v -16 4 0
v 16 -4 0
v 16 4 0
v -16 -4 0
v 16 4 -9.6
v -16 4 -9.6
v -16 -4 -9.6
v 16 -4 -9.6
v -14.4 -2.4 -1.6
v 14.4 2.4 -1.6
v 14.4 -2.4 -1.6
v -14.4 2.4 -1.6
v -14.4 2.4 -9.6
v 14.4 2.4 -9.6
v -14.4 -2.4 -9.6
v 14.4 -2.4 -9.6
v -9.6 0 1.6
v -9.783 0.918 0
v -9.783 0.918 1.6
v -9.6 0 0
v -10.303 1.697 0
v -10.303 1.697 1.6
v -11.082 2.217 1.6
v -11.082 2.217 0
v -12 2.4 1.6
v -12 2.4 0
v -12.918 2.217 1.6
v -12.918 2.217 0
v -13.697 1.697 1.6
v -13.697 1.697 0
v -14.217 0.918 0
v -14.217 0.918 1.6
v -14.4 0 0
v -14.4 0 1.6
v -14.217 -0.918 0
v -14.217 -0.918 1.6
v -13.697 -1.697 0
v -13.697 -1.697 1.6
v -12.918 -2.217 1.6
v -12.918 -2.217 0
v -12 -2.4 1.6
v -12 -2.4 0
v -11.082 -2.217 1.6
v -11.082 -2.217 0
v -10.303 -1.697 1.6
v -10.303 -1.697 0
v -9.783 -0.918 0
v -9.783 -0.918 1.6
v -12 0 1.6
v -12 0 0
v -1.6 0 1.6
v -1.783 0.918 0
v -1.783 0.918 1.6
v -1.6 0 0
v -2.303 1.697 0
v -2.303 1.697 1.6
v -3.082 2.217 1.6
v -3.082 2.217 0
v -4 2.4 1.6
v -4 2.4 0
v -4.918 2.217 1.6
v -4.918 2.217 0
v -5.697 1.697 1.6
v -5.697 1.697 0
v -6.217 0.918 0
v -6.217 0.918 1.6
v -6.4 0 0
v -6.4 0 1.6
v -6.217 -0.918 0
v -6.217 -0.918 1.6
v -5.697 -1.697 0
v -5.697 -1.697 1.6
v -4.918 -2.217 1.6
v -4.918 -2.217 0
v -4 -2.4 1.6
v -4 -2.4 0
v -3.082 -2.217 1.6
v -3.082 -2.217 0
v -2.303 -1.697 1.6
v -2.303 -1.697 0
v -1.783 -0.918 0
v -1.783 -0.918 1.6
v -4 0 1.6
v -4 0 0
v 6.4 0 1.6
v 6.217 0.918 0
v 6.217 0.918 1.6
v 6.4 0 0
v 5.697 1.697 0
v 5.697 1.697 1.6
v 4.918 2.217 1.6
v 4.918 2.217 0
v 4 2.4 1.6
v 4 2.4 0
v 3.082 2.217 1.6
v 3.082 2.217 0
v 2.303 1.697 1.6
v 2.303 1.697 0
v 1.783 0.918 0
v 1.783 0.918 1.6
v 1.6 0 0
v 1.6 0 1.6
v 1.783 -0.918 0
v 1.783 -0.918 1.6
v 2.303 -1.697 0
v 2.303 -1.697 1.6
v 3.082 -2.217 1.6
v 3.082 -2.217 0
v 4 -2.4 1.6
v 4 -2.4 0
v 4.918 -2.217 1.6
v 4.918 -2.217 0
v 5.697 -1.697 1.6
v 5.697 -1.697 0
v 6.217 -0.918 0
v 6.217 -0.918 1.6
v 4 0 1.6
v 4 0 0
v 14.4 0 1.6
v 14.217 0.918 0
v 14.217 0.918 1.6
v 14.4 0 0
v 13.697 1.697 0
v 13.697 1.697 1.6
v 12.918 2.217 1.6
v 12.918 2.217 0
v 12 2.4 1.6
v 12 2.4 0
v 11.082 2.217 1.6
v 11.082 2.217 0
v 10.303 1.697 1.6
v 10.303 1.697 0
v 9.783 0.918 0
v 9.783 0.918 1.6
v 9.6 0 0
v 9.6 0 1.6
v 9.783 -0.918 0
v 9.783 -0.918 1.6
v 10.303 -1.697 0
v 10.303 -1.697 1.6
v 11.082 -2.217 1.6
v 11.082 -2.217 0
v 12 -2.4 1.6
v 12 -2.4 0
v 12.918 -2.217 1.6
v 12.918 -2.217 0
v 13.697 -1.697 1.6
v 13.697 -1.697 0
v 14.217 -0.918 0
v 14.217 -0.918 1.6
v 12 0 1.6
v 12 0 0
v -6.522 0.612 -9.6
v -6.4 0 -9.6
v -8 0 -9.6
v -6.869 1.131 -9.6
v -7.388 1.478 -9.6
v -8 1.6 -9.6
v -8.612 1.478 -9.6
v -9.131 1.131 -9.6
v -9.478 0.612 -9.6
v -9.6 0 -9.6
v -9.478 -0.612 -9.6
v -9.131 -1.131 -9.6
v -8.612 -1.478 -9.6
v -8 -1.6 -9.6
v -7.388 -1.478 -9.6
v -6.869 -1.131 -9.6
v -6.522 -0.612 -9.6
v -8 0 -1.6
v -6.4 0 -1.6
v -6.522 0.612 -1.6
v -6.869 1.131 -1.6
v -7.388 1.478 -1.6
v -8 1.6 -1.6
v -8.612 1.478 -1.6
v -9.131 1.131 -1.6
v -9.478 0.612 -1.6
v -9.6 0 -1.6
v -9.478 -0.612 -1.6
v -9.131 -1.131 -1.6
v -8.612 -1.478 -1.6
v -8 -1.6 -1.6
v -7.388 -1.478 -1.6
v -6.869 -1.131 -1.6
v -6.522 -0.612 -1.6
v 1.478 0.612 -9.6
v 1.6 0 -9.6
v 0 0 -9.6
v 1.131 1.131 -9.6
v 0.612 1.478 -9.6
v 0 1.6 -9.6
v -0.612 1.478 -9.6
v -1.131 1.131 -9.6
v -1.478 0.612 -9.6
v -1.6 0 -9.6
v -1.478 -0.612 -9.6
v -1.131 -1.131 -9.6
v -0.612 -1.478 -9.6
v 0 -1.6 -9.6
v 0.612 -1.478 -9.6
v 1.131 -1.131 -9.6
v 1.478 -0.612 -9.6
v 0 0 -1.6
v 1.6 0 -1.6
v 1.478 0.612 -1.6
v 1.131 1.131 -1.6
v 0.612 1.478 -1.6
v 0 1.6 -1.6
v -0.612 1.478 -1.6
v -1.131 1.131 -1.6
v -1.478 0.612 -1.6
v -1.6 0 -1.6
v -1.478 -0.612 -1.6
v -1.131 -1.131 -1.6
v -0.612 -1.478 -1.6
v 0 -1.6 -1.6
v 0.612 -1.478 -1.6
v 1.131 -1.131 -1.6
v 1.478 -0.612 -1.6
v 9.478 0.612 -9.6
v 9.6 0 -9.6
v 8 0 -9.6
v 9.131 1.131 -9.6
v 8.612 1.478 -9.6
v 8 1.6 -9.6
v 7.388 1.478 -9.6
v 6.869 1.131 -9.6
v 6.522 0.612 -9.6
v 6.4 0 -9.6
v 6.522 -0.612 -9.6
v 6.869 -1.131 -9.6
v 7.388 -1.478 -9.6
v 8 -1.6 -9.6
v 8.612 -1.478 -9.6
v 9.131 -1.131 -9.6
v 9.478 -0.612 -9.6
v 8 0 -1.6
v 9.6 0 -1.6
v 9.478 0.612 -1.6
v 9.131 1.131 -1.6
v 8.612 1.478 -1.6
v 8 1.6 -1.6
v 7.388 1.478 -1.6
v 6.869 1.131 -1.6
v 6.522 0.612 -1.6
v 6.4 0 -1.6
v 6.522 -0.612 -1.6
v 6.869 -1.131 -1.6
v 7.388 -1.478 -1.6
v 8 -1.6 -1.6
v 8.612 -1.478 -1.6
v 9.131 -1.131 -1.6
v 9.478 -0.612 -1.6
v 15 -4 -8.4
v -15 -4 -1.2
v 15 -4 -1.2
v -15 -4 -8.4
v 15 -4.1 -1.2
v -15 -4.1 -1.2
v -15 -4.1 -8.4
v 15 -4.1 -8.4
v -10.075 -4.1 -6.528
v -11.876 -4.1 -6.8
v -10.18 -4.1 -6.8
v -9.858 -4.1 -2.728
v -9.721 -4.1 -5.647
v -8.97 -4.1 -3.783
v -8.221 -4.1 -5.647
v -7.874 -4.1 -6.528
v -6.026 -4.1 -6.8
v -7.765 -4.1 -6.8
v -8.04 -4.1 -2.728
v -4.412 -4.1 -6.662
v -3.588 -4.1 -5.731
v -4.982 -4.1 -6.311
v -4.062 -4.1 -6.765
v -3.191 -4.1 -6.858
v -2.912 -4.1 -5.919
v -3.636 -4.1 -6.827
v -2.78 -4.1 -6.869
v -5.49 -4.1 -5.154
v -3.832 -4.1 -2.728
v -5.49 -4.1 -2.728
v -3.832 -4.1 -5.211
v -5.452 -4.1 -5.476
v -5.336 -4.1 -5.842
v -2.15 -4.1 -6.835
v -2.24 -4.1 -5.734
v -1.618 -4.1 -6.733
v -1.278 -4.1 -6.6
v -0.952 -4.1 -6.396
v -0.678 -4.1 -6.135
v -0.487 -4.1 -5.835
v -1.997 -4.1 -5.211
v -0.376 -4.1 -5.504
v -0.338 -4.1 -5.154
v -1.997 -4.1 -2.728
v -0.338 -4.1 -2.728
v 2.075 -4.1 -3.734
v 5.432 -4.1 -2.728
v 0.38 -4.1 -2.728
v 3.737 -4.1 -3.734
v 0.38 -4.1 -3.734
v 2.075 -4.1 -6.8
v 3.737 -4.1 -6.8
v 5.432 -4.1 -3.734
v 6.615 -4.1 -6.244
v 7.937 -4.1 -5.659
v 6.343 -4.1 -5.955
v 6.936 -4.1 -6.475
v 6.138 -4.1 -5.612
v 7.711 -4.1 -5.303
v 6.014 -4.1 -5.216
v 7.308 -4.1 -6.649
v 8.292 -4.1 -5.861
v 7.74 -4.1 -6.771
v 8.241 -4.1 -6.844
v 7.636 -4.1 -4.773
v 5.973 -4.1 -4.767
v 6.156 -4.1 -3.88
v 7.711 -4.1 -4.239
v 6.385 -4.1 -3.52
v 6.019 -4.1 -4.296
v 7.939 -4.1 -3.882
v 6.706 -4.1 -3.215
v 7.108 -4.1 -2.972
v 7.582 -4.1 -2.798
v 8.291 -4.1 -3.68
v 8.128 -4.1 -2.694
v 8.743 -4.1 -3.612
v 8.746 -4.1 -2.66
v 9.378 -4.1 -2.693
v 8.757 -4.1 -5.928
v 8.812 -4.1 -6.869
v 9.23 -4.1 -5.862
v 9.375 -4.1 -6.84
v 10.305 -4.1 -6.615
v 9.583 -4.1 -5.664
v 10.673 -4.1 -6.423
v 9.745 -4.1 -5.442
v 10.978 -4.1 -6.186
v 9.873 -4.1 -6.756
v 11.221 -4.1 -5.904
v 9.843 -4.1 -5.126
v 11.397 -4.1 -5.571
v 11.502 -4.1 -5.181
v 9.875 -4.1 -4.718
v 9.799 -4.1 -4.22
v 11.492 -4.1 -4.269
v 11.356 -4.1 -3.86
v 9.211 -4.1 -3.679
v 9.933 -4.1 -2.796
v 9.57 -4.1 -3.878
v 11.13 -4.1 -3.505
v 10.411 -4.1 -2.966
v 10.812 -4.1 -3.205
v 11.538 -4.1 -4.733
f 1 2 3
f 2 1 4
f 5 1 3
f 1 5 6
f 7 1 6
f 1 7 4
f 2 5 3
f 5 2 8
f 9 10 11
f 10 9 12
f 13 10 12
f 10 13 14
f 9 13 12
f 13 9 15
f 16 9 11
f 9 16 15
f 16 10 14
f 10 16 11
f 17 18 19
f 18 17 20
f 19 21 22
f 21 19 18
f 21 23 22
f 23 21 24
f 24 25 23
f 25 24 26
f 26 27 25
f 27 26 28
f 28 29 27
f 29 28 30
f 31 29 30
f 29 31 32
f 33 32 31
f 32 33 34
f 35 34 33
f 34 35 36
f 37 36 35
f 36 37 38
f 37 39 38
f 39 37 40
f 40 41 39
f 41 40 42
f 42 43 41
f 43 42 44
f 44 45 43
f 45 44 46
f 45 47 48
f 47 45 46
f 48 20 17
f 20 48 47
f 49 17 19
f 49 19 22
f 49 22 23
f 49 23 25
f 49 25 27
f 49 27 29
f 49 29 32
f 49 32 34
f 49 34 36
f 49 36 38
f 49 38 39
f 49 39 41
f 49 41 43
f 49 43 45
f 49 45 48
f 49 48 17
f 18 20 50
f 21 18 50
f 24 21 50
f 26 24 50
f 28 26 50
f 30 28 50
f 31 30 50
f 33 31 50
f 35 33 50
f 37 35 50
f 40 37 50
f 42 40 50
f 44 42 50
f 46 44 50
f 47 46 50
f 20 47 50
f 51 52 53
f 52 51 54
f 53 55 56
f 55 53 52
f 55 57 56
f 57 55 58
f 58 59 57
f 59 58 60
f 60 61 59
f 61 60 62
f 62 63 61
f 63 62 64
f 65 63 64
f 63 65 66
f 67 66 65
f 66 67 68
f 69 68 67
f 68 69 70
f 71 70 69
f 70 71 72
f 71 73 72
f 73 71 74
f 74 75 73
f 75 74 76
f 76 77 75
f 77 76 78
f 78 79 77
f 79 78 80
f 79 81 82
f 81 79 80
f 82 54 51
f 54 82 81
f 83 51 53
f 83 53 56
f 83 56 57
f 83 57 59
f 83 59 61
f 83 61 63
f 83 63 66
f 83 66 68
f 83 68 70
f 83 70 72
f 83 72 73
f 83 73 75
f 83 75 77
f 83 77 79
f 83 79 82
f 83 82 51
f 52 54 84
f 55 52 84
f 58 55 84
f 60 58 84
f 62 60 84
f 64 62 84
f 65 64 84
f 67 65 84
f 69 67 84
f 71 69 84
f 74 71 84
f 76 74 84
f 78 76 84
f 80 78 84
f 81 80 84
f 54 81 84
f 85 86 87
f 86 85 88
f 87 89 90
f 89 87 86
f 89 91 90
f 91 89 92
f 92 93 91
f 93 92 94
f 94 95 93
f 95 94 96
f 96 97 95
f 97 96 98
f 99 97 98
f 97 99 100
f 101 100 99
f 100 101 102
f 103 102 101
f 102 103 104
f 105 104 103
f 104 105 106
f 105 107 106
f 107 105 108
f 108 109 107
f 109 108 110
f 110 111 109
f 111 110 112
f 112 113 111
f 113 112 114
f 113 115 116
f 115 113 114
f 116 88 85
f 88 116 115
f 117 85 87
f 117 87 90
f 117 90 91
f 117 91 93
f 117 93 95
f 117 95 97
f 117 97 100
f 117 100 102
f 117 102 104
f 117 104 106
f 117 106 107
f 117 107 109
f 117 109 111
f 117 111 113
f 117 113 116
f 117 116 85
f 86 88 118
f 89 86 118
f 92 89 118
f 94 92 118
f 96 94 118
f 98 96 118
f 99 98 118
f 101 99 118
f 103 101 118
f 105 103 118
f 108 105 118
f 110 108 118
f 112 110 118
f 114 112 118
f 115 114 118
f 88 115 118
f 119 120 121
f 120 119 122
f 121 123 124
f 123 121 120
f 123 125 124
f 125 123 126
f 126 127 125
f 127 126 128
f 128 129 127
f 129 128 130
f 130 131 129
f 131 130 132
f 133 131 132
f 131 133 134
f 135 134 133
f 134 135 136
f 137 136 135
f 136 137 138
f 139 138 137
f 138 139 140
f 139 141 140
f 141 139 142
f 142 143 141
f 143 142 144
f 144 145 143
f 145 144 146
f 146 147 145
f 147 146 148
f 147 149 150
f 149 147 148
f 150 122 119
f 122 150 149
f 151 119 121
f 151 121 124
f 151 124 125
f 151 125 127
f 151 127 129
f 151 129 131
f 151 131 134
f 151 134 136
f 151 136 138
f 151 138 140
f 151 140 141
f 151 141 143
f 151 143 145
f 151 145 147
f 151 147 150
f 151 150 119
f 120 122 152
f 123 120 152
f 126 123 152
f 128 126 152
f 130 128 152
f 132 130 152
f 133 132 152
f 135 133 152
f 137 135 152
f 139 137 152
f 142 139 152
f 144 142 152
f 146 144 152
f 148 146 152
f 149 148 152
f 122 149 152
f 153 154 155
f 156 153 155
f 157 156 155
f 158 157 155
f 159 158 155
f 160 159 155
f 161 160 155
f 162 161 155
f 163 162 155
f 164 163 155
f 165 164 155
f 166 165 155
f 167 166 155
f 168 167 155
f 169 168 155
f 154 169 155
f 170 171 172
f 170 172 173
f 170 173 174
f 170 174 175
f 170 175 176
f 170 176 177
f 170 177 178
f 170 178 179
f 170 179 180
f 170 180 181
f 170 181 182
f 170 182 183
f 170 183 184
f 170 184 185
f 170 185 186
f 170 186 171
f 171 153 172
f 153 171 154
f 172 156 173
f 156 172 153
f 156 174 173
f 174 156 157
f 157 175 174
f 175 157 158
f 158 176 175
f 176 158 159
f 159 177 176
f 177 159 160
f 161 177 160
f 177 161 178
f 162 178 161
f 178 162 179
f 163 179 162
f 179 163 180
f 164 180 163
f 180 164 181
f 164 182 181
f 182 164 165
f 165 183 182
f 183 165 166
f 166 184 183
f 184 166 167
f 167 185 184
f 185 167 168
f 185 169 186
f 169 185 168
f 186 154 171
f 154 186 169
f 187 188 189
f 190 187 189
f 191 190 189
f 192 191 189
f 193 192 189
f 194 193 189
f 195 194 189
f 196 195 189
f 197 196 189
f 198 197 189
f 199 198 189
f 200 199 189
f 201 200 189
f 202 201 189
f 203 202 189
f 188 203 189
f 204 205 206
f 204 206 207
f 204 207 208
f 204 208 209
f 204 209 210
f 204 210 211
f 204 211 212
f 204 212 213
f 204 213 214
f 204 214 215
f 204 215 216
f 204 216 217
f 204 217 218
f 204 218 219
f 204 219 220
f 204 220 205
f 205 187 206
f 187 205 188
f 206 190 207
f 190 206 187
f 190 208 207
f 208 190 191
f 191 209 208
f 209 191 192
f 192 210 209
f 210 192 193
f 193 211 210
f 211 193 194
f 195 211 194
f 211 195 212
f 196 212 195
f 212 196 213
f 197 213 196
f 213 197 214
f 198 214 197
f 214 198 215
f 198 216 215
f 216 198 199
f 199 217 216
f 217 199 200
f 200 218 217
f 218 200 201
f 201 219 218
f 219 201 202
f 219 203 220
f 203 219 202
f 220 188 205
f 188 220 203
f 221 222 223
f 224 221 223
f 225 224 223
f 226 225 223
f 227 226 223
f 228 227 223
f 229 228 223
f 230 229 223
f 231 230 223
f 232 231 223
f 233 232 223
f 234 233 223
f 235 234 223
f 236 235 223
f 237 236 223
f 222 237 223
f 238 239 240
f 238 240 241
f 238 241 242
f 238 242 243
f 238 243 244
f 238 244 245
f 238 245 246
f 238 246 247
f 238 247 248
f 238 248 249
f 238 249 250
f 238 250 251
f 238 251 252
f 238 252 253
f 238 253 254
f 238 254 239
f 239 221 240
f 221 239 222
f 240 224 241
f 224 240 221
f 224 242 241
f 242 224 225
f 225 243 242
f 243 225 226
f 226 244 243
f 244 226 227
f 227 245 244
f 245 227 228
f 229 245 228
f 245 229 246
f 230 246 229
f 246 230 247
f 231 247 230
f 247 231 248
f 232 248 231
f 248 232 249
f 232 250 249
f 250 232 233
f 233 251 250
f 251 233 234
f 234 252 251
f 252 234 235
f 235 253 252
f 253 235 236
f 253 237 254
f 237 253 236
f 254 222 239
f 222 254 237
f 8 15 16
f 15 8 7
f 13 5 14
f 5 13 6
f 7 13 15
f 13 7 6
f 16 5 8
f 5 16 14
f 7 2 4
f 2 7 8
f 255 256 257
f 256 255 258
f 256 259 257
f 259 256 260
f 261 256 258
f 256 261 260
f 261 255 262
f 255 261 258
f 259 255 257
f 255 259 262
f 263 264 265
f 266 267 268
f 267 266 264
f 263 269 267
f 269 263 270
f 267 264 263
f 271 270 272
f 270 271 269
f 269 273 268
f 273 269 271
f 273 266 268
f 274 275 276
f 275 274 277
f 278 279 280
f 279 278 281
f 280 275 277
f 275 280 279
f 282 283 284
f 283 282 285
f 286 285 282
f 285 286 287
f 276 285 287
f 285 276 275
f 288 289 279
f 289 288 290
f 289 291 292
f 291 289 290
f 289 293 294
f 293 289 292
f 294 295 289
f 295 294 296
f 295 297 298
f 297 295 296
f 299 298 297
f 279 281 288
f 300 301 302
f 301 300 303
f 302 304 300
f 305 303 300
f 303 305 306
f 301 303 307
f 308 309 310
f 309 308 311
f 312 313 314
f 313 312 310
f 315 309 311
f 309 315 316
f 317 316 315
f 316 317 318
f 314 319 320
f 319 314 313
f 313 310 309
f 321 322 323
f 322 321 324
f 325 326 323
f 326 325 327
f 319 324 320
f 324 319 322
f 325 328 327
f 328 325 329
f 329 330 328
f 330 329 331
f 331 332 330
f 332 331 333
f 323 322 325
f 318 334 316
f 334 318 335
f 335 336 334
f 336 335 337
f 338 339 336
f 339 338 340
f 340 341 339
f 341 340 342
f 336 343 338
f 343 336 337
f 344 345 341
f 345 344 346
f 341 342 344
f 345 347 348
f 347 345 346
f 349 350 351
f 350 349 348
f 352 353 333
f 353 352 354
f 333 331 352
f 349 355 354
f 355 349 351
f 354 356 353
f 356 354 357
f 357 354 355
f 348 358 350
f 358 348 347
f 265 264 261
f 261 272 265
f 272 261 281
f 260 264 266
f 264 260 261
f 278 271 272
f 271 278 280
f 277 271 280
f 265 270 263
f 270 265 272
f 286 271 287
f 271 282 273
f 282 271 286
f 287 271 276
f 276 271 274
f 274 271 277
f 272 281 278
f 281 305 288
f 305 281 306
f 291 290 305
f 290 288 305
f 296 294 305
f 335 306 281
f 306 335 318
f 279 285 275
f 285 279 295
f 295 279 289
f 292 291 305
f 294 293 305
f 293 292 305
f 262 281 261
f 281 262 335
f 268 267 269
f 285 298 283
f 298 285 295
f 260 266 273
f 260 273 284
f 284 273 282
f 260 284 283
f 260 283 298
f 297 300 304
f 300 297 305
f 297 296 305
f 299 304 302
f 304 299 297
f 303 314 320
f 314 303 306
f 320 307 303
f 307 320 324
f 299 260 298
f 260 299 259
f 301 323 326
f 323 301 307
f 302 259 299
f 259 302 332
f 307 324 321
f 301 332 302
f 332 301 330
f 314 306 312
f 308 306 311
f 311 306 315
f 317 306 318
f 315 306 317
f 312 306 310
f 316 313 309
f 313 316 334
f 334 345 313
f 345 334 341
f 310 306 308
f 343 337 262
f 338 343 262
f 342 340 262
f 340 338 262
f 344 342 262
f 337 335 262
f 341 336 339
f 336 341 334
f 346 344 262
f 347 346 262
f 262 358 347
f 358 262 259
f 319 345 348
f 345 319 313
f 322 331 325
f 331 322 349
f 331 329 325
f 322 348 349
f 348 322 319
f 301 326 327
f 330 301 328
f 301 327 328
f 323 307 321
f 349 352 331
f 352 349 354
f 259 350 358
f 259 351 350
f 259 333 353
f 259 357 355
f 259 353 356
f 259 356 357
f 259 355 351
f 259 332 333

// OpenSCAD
// file: ../p/4-4edge.scad
use <../lib.scad>
function ldraw_lib__4_4edge() = [
// 0 Circle 1.0
// 0 Name: 4-4edge.dat
// 0 Author: James Jessiman
// 0 !LDRAW_ORG Primitive UPDATE 2017-01
// 0 !LICENSE Licensed under CC BY 2.0 and CC BY 4.0 : see CAreadme.txt
// 
// 0 BFC CERTIFY CCW
  [0,"BFC","CERTIFY"],
  [0,"BFC","CCW"],
// 
// 0 !HISTORY 1998-12-15 [PTadmin] Official Update 1998-10
// 0 !HISTORY 2005-12-28 [PTadmin] Official Update 2005-01
// 0 !HISTORY 2007-06-24 [PTadmin] Header formatted for Contributor Agreement
// 0 !HISTORY 2008-07-01 [PTadmin] Official Update 2008-01
// 0 !HISTORY 2017-01-15 [Steffen] BFCed
// 0 !HISTORY 2017-12-30 [PTadmin] Official Update 2017-01
// 
// 
// 2 24 1 0 0 0.9239 0 0.3827
  [2,24,1,0,0,0.9239,0,0.3827],
// 2 24 0.9239 0 0.3827 0.7071 0 0.7071
  [2,24,0.9239,0,0.3827,0.7071,0,0.7071],
// 2 24 0.7071 0 0.7071 0.3827 0 0.9239
  [2,24,0.7071,0,0.7071,0.3827,0,0.9239],
// 2 24 0.3827 0 0.9239 0 0 1
  [2,24,0.3827,0,0.9239,0,0,1],
// 2 24 0 0 1 -0.3827 0 0.9239
  [2,24,0,0,1,-0.3827,0,0.9239],
// 2 24 -0.3827 0 0.9239 -0.7071 0 0.7071
  [2,24,-0.3827,0,0.9239,-0.7071,0,0.7071],
// 2 24 -0.7071 0 0.7071 -0.9239 0 0.3827
  [2,24,-0.7071,0,0.7071,-0.9239,0,0.3827],
// 2 24 -0.9239 0 0.3827 -1 0 -0
  [2,24,-0.9239,0,0.3827,-1,0,-0],
// 2 24 -1 0 -0 -0.9239 0 -0.3827
  [2,24,-1,0,-0,-0.9239,0,-0.3827],
// 2 24 -0.9239 0 -0.3827 -0.7071 0 -0.7071
  [2,24,-0.9239,0,-0.3827,-0.7071,0,-0.7071],
// 2 24 -0.7071 0 -0.7071 -0.3827 0 -0.9239
  [2,24,-0.7071,0,-0.7071,-0.3827,0,-0.9239],
// 2 24 -0.3827 0 -0.9239 0 0 -1
  [2,24,-0.3827,0,-0.9239,0,0,-1],
// 2 24 0 0 -1 0.3827 0 -0.9239
  [2,24,0,0,-1,0.3827,0,-0.9239],
// 2 24 0.3827 0 -0.9239 0.7071 0 -0.7071
  [2,24,0.3827,0,-0.9239,0.7071,0,-0.7071],
// 2 24 0.7071 0 -0.7071 0.9239 0 -0.3827
  [2,24,0.7071,0,-0.7071,0.9239,0,-0.3827],
// 2 24 0.9239 0 -0.3827 1 0 0
  [2,24,0.9239,0,-0.3827,1,0,0],
];
module ldraw_lib__4_4edge(step=0, col=false, unit=2/5, alt=false, line=0.2, solid=!$preview)
    makepoly(ldraw_lib__4_4edge(), step=step, col=col, unit=unit, alt=alt, line=line, solid=solid);
ldraw_lib__4_4edge(line=0.2);
// file: ../p/4-4disc.scad
use <../lib.scad>
function ldraw_lib__4_4disc() = [
// 0 Disc 1.0
// 0 Name: 4-4disc.dat
// 0 Author: James Jessiman
// 0 !LDRAW_ORG Primitive UPDATE 2002-02
// 0 !LICENSE Licensed under CC BY 2.0 and CC BY 4.0 : see CAreadme.txt
// 
// 0 BFC CERTIFY CCW
  [0,"BFC","CERTIFY"],
  [0,"BFC","CCW"],
// 
// 0 !HISTORY 1998-12-15 [PTadmin] Official Update 1998-10
// 0 !HISTORY 2002-03-23 [sbliss] Added BFC statement
// 0 !HISTORY 2002-04-25 [PTadmin] Official Update 2002-02
// 0 !HISTORY 2007-06-24 [PTadmin] Header formatted for Contributor Agreement
// 0 !HISTORY 2008-07-01 [PTadmin] Official Update 2008-01
// 
// 
// 3 16 0 0 0 1 0 0 0.9239 0 0.3827
  [3,16,0,0,0,1,0,0,0.9239,0,0.3827],
// 3 16 0 0 0 0.9239 0 0.3827 0.7071 0 0.7071
  [3,16,0,0,0,0.9239,0,0.3827,0.7071,0,0.7071],
// 3 16 0 0 0 0.7071 0 0.7071 0.3827 0 0.9239
  [3,16,0,0,0,0.7071,0,0.7071,0.3827,0,0.9239],
// 3 16 0 0 0 0.3827 0 0.9239 0 0 1
  [3,16,0,0,0,0.3827,0,0.9239,0,0,1],
// 3 16 0 0 0 0 0 1 -0.3827 0 0.9239
  [3,16,0,0,0,0,0,1,-0.3827,0,0.9239],
// 3 16 0 0 0 -0.3827 0 0.9239 -0.7071 0 0.7071
  [3,16,0,0,0,-0.3827,0,0.9239,-0.7071,0,0.7071],
// 3 16 0 0 0 -0.7071 0 0.7071 -0.9239 0 0.3827
  [3,16,0,0,0,-0.7071,0,0.7071,-0.9239,0,0.3827],
// 3 16 0 0 0 -0.9239 0 0.3827 -1 0 -0
  [3,16,0,0,0,-0.9239,0,0.3827,-1,0,-0],
// 3 16 0 0 0 -1 0 -0 -0.9239 0 -0.3827
  [3,16,0,0,0,-1,0,-0,-0.9239,0,-0.3827],
// 3 16 0 0 0 -0.9239 0 -0.3827 -0.7071 0 -0.7071
  [3,16,0,0,0,-0.9239,0,-0.3827,-0.7071,0,-0.7071],
// 3 16 0 0 0 -0.7071 0 -0.7071 -0.3827 0 -0.9239
  [3,16,0,0,0,-0.7071,0,-0.7071,-0.3827,0,-0.9239],
// 3 16 0 0 0 -0.3827 0 -0.9239 0 0 -1
  [3,16,0,0,0,-0.3827,0,-0.9239,0,0,-1],
// 3 16 0 0 0 0 0 -1 0.3827 0 -0.9239
  [3,16,0,0,0,0,0,-1,0.3827,0,-0.9239],
// 3 16 0 0 0 0.3827 0 -0.9239 0.7071 0 -0.7071
  [3,16,0,0,0,0.3827,0,-0.9239,0.7071,0,-0.7071],
// 3 16 0 0 0 0.7071 0 -0.7071 0.9239 0 -0.3827
  [3,16,0,0,0,0.7071,0,-0.7071,0.9239,0,-0.3827],
// 3 16 0 0 0 0.9239 0 -0.3827 1 0 0
  [3,16,0,0,0,0.9239,0,-0.3827,1,0,0],
// 0
];
module ldraw_lib__4_4disc(step=0, col=false, unit=2/5, alt=false, line=0.2, solid=!$preview)
    makepoly(ldraw_lib__4_4disc(), step=step, col=col, unit=unit, alt=alt, line=line, solid=solid);
ldraw_lib__4_4disc(line=0.2);
// file: ../p/4-4cyli.scad
use <../lib.scad>
$fa=1; $fs=0.2;
function ldraw_lib__4_4cyli(realsolid=false) = [
// 0 Cylinder 1.0
// 0 Name: 4-4cyli.dat
// 0 Author: James Jessiman
// 0 !LDRAW_ORG Primitive UPDATE 2005-01
// 0 !LICENSE Licensed under CC BY 2.0 and CC BY 4.0 : see CAreadme.txt
// 
// 0 BFC CERTIFY CCW
  [0,"BFC","CERTIFY"],
  [0,"BFC","CCW"],
// 
// 0 !HISTORY 1998-12-15 [PTadmin] Official Update 1998-10
// 0 !HISTORY 2002-03-23 [sbliss] Added BFC statement; merged headers from files in distributions LDraw 0.27 and Complete.
// 0 !HISTORY 2002-04-25 [PTadmin] Official Update 2002-02
// 0 !HISTORY 2004-12-14 [guyvivan] BFC CCW
// 0 !HISTORY 2005-12-28 [PTadmin] Official Update 2005-01
// 0 !HISTORY 2007-06-24 [PTadmin] Header formatted for Contributor Agreement
// 0 !HISTORY 2008-07-01 [PTadmin] Official Update 2008-01
// 
// 
// 4 16 1 1 0 0.9239 1 0.3827 0.9239 0 0.3827 1 0 0
  [4,16,1,1,0,0.9239,1,0.3827,0.9239,0,0.3827,1,0,0],
// 5 24 1 0 0 1 1 0 0.9239 0 0.3827 0.9239 0 -0.3827
  [5,24,1,0,0,1,1,0,0.9239,0,0.3827,0.9239,0,-0.3827],
// 4 16 0.9239 1 0.3827 0.7071 1 0.7071 0.7071 0 0.7071 0.9239 0 0.3827
  [4,16,0.9239,1,0.3827,0.7071,1,0.7071,0.7071,0,0.7071,0.9239,0,0.3827],
// 5 24 0.9239 0 0.3827 0.9239 1 0.3827 0.7071 0 0.7071 1 0 0
  [5,24,0.9239,0,0.3827,0.9239,1,0.3827,0.7071,0,0.7071,1,0,0],
// 4 16 0.7071 1 0.7071 0.3827 1 0.9239 0.3827 0 0.9239 0.7071 0 0.7071
  [4,16,0.7071,1,0.7071,0.3827,1,0.9239,0.3827,0,0.9239,0.7071,0,0.7071],
// 5 24 0.7071 0 0.7071 0.7071 1 0.7071 0.3827 0 0.9239 0.9239 0 0.3827
  [5,24,0.7071,0,0.7071,0.7071,1,0.7071,0.3827,0,0.9239,0.9239,0,0.3827],
// 4 16 0.3827 1 0.9239 0 1 1 0 0 1 0.3827 0 0.9239
  [4,16,0.3827,1,0.9239,0,1,1,0,0,1,0.3827,0,0.9239],
// 5 24 0.3827 0 0.9239 0.3827 1 0.9239 0 0 1 0.7071 0 0.7071
  [5,24,0.3827,0,0.9239,0.3827,1,0.9239,0,0,1,0.7071,0,0.7071],
// 4 16 0 1 1 -0.3827 1 0.9239 -0.3827 0 0.9239 0 0 1
  [4,16,0,1,1,-0.3827,1,0.9239,-0.3827,0,0.9239,0,0,1],
// 5 24 0 0 1 0 1 1 -0.3827 0 0.9239 0.3827 0 0.9239
  [5,24,0,0,1,0,1,1,-0.3827,0,0.9239,0.3827,0,0.9239],
// 4 16 -0.3827 1 0.9239 -0.7071 1 0.7071 -0.7071 0 0.7071 -0.3827 0 0.9239
  [4,16,-0.3827,1,0.9239,-0.7071,1,0.7071,-0.7071,0,0.7071,-0.3827,0,0.9239],
// 5 24 -0.3827 0 0.9239 -0.3827 1 0.9239 -0.7071 0 0.7071 0 0 1
  [5,24,-0.3827,0,0.9239,-0.3827,1,0.9239,-0.7071,0,0.7071,0,0,1],
// 4 16 -0.7071 1 0.7071 -0.9239 1 0.3827 -0.9239 0 0.3827 -0.7071 0 0.7071
  [4,16,-0.7071,1,0.7071,-0.9239,1,0.3827,-0.9239,0,0.3827,-0.7071,0,0.7071],
// 5 24 -0.7071 0 0.7071 -0.7071 1 0.7071 -0.9239 0 0.3827 -0.3827 0 0.9239
  [5,24,-0.7071,0,0.7071,-0.7071,1,0.7071,-0.9239,0,0.3827,-0.3827,0,0.9239],
// 4 16 -0.9239 1 0.3827 -1 1 0 -1 0 0 -0.9239 0 0.3827
  [4,16,-0.9239,1,0.3827,-1,1,0,-1,0,0,-0.9239,0,0.3827],
// 5 24 -0.9239 0 0.3827 -0.9239 1 0.3827 -1 0 0 -0.7071 0 0.7071
  [5,24,-0.9239,0,0.3827,-0.9239,1,0.3827,-1,0,0,-0.7071,0,0.7071],
// 4 16 -1 1 0 -0.9239 1 -0.3827 -0.9239 0 -0.3827 -1 0 0
  [4,16,-1,1,0,-0.9239,1,-0.3827,-0.9239,0,-0.3827,-1,0,0],
// 5 24 -1 0 0 -1 1 0 -0.9239 0 -0.3827 -0.9239 0 0.3827
  [5,24,-1,0,0,-1,1,0,-0.9239,0,-0.3827,-0.9239,0,0.3827],
// 4 16 -0.9239 1 -0.3827 -0.7071 1 -0.7071 -0.7071 0 -0.7071 -0.9239 0 -0.3827
  [4,16,-0.9239,1,-0.3827,-0.7071,1,-0.7071,-0.7071,0,-0.7071,-0.9239,0,-0.3827],
// 5 24 -0.9239 0 -0.3827 -0.9239 1 -0.3827 -0.7071 0 -0.7071 -1 0 0
  [5,24,-0.9239,0,-0.3827,-0.9239,1,-0.3827,-0.7071,0,-0.7071,-1,0,0],
// 4 16 -0.7071 1 -0.7071 -0.3827 1 -0.9239 -0.3827 0 -0.9239 -0.7071 0 -0.7071
  [4,16,-0.7071,1,-0.7071,-0.3827,1,-0.9239,-0.3827,0,-0.9239,-0.7071,0,-0.7071],
// 5 24 -0.7071 0 -0.7071 -0.7071 1 -0.7071 -0.3827 0 -0.9239 -0.9239 0 -0.3827
  [5,24,-0.7071,0,-0.7071,-0.7071,1,-0.7071,-0.3827,0,-0.9239,-0.9239,0,-0.3827],
// 4 16 -0.3827 1 -0.9239 0 1 -1 0 0 -1 -0.3827 0 -0.9239
  [4,16,-0.3827,1,-0.9239,0,1,-1,0,0,-1,-0.3827,0,-0.9239],
// 5 24 -0.3827 0 -0.9239 -0.3827 1 -0.9239 0 0 -1 -0.7071 0 -0.7071
  [5,24,-0.3827,0,-0.9239,-0.3827,1,-0.9239,0,0,-1,-0.7071,0,-0.7071],
// 4 16 0 1 -1 0.3827 1 -0.9239 0.3827 0 -0.9239 0 0 -1
  [4,16,0,1,-1,0.3827,1,-0.9239,0.3827,0,-0.9239,0,0,-1],
// 5 24 0 0 -1 0 1 -1 0.3827 0 -0.9239 -0.3827 0 -0.9239
  [5,24,0,0,-1,0,1,-1,0.3827,0,-0.9239,-0.3827,0,-0.9239],
// 4 16 0.3827 1 -0.9239 0.7071 1 -0.7071 0.7071 0 -0.7071 0.3827 0 -0.9239
  [4,16,0.3827,1,-0.9239,0.7071,1,-0.7071,0.7071,0,-0.7071,0.3827,0,-0.9239],
// 5 24 0.3827 0 -0.9239 0.3827 1 -0.9239 0.7071 0 -0.7071 0 0 -1
  [5,24,0.3827,0,-0.9239,0.3827,1,-0.9239,0.7071,0,-0.7071,0,0,-1],
// 4 16 0.7071 1 -0.7071 0.9239 1 -0.3827 0.9239 0 -0.3827 0.7071 0 -0.7071
  [4,16,0.7071,1,-0.7071,0.9239,1,-0.3827,0.9239,0,-0.3827,0.7071,0,-0.7071],
// 5 24 0.7071 0 -0.7071 0.7071 1 -0.7071 0.9239 0 -0.3827 0.3827 0 -0.9239
  [5,24,0.7071,0,-0.7071,0.7071,1,-0.7071,0.9239,0,-0.3827,0.3827,0,-0.9239],
// 4 16 0.9239 1 -0.3827 1 1 0 1 0 0 0.9239 0 -0.3827
  [4,16,0.9239,1,-0.3827,1,1,0,1,0,0,0.9239,0,-0.3827],
// 5 24 0.9239 0 -0.3827 0.9239 1 -0.3827 1 0 0 0.7071 0 -0.7071
  [5,24,0.9239,0,-0.3827,0.9239,1,-0.3827,1,0,0,0.7071,0,-0.7071],
// 0
];
module ldraw_lib__4_4cyli(step=0, col=false, unit=2/5, alt=false, line=0.2, solid=!$preview)
    makepoly(ldraw_lib__4_4cyli(solid), step=step, col=col, unit=unit, alt=alt, line=line, solid=solid);
ldraw_lib__4_4cyli(line=0.2);
// file: ../p/stud3.scad
use <../lib.scad>
use <4-4cyli.scad>
use <4-4disc.scad>
use <4-4edge.scad>
function ldraw_lib__stud3() = [
// 0 Stud Tube Solid
// 0 Name: stud3.dat
// 0 Author: James Jessiman
// 0 !LDRAW_ORG Primitive UPDATE 2012-01
// 0 !LICENSE Licensed under CC BY 4.0 : see CAreadme.txt
// 
// 0 BFC CERTIFY CCW
  [0,"BFC","CERTIFY"],
  [0,"BFC","CCW"],
// 
// 0 !HISTORY 2002-04-04 [sbliss] Modified for BFC compliance
// 0 !HISTORY 2002-04-25 [PTadmin] Official Update 2002-02
// 0 !HISTORY 2007-06-24 [PTadmin] Header formatted for Contributor Agreement
// 0 !HISTORY 2008-07-01 [PTadmin] Official Update 2008-01
// 0 !HISTORY 2012-02-16 [Philo] Changed to CCW
// 0 !HISTORY 2012-03-30 [PTadmin] Official Update 2012-01
// 
// 
// 1 16 0 -4 0 4 0 0 0 1 0 0 0 4 4-4edge.dat
  [1,16,0,-4,0,4,0,0,0,1,0,0,0,4, ldraw_lib__4_4edge()],
// 1 16 0 0 0 4 0 0 0 1 0 0 0 4 4-4edge.dat
  [1,16,0,0,0,4,0,0,0,1,0,0,0,4, ldraw_lib__4_4edge()],
// 1 16 0 -4 0 4 0 0 0 1 0 0 0 4 4-4disc.dat
  [1,16,0,-4,0,4,0,0,0,1,0,0,0,4, ldraw_lib__4_4disc()],
  [-1,16,0,0,0,4,0,0,0,-1,0,0,0,4, ldraw_lib__4_4disc()],
// 1 16 0 -4 0 4 0 0 0 4 0 0 0 4 4-4cyli.dat
  [1,16,0,-4,0,4,0,0,0,4,0,0,0,4, ldraw_lib__4_4cyli()],
];
module ldraw_lib__stud3(step=0, col=false, unit=2/5, alt=false, line=0.2, solid=!$preview)
    makepoly(ldraw_lib__stud3(), step=step, col=col, unit=unit, alt=alt, line=line, solid=solid);
ldraw_lib__stud3(line=0.2);
// file: ../p/stud.scad
use <../lib.scad>
use <4-4cyli.scad>
use <4-4disc.scad>
use <4-4edge.scad>
function ldraw_lib__stud() = [
// 0 Stud
// 0 Name: stud.dat
// 0 Author: James Jessiman
// 0 !LDRAW_ORG Primitive UPDATE 2012-01
// 0 !LICENSE Licensed under CC BY 4.0 : see CAreadme.txt
// 
// 0 BFC CERTIFY CCW
  [0,"BFC","CERTIFY"],
  [0,"BFC","CCW"],
// 
// 0 !HISTORY 2002-04-04 [sbliss] Modified for BFC compliance
// 0 !HISTORY 2002-04-25 [PTadmin] Official Update 2002-02
// 0 !HISTORY 2007-06-24 [PTadmin] Header formatted for Contributor Agreement
// 0 !HISTORY 2008-07-01 [PTadmin] Official Update 2008-01
// 0 !HISTORY 2012-02-16 [Philo] Changed to CCW
// 0 !HISTORY 2012-03-30 [PTadmin] Official Update 2012-01
// 
// 
// 1 16 0 0 0 6 0 0 0 1 0 0 0 6 4-4edge.dat
  [1,16,0,0,0,6,0,0,0,1,0,0,0,6, ldraw_lib__4_4edge()],
// 1 16 0 -4 0 6 0 0 0 1 0 0 0 6 4-4edge.dat
  [1,16,0,-4,0,6,0,0,0,1,0,0,0,6, ldraw_lib__4_4edge()],
// 1 16 0 0 0 6 0 0 0 -4 0 0 0 6 4-4cyli.dat
  [1,16,0,0,0,6,0,0,0,-4,0,0,0,6, ldraw_lib__4_4cyli()],
// 1 16 0 -4 0 6 0 0 0 1 0 0 0 6 4-4disc.dat
  [1,16,0,-4,0,6,0,0,0,1,0,0,0,6, ldraw_lib__4_4disc()],
  [-1,16,0,0,0,6,0,0,0,-1,0,0,0,6, ldraw_lib__4_4disc()],
];
module ldraw_lib__stud(step=0, col=false, unit=2/5, alt=false, line=0.2, solid=!$preview)
    makepoly(ldraw_lib__stud(), step=step, col=col, unit=unit, alt=alt, line=line, solid=solid);
ldraw_lib__stud(line=0.2);
// file: ../p/box5.scad
use <../lib.scad>
function ldraw_lib__box5() = [
// 0 Box with 5 Faces and All Edges
// 0 Name: box5.dat
// 0 Author: James Jessiman
// 0 !LDRAW_ORG Primitive UPDATE 2012-01
// 0 !LICENSE Licensed under CC BY 2.0 and CC BY 4.0 : see CAreadme.txt
// 
// 0 BFC CERTIFY CCW
  [0,"BFC","CERTIFY"],
  [0,"BFC","CCW"],
// 
// 0 !HISTORY 2002-04-03 [sbliss] Modified for BFC compliance
// 0 !HISTORY 2002-04-25 [PTadmin] Official Update 2002-02
// 0 !HISTORY 2007-06-24 [PTadmin] Header formatted for Contributor Agreement
// 0 !HISTORY 2008-07-01 [PTadmin] Official Update 2008-01
// 0 !HISTORY 2012-02-16 [Philo] Changed to CCW
// 0 !HISTORY 2012-03-30 [PTadmin] Official Update 2012-01
// 
// 
// 2 24 1 1 1 -1 1 1
  [2,24,1,1,1,-1,1,1],
// 2 24 -1 1 1 -1 1 -1
  [2,24,-1,1,1,-1,1,-1],
// 2 24 -1 1 -1 1 1 -1
  [2,24,-1,1,-1,1,1,-1],
// 2 24 1 1 -1 1 1 1
  [2,24,1,1,-1,1,1,1],
// 2 24 1 0 1 -1 0 1
  [2,24,1,0,1,-1,0,1],
// 2 24 -1 0 1 -1 0 -1
  [2,24,-1,0,1,-1,0,-1],
// 2 24 -1 0 -1 1 0 -1
  [2,24,-1,0,-1,1,0,-1],
// 2 24 1 0 -1 1 0 1
  [2,24,1,0,-1,1,0,1],
// 2 24 1 0 1 1 1 1
  [2,24,1,0,1,1,1,1],
// 2 24 -1 0 1 -1 1 1
  [2,24,-1,0,1,-1,1,1],
// 2 24 1 0 -1 1 1 -1
  [2,24,1,0,-1,1,1,-1],
// 2 24 -1 0 -1 -1 1 -1
  [2,24,-1,0,-1,-1,1,-1],
// 4 16 -1 1 1 1 1 1 1 1 -1 -1 1 -1
  [4,16,-1,1,1,1,1,1,1,1,-1,-1,1,-1],
// 4 16 -1 1 1 -1 0 1 1 0 1 1 1 1
  [4,16,-1,1,1,-1,0,1,1,0,1,1,1,1],
// 4 16 -1 1 -1 -1 0 -1 -1 0 1 -1 1 1
  [4,16,-1,1,-1,-1,0,-1,-1,0,1,-1,1,1],
// 4 16 1 1 -1 1 0 -1 -1 0 -1 -1 1 -1
  [4,16,1,1,-1,1,0,-1,-1,0,-1,-1,1,-1],
// 4 16 1 1 1 1 0 1 1 0 -1 1 1 -1
  [4,16,1,1,1,1,0,1,1,0,-1,1,1,-1],
];
makepoly(ldraw_lib__box5(), line=0.2);
// file: ../p/box4t.scad
use <../lib.scad>
function ldraw_lib__box4t() = [
// 0 Box with 4 Adjacent Faces and All Edges
// 0 Name: box4t.dat
// 0 Author: Tore Eriksson [Tore_Eriksson]
// 0 !LDRAW_ORG Primitive UPDATE 2003-02
// 0 !LICENSE Licensed under CC BY 2.0 and CC BY 4.0 : see CAreadme.txt
// 
// 0 BFC CERTIFY CCW
  [0,"BFC","CERTIFY"],
  [0,"BFC","CCW"],
// 
// 0 !HISTORY 1997-09-29 [PTadmin] Official Update 1997-15
// 0 !HISTORY 2002-08-31 [izanette] Modified with WINDZ for BFC compliance
// 0 !HISTORY 2003-08-01 [PTadmin] Official Update 2003-02
// 0 !HISTORY 2007-06-24 [PTadmin] Header formatted for Contributor Agreement
// 0 !HISTORY 2008-07-01 [PTadmin] Official Update 2008-01
// 
// 
// 2 24 1 1 1 -1 1 1
  [2,24,1,1,1,-1,1,1],
// 2 24 -1 1 1 -1 1 -1
  [2,24,-1,1,1,-1,1,-1],
// 2 24 -1 1 -1 1 1 -1
  [2,24,-1,1,-1,1,1,-1],
// 2 24 1 1 -1 1 1 1
  [2,24,1,1,-1,1,1,1],
// 2 24 1 0 1 -1 0 1
  [2,24,1,0,1,-1,0,1],
// 2 24 -1 0 1 -1 0 -1
  [2,24,-1,0,1,-1,0,-1],
// 2 24 -1 0 -1 1 0 -1
  [2,24,-1,0,-1,1,0,-1],
// 2 24 1 0 -1 1 0 1
  [2,24,1,0,-1,1,0,1],
// 2 24 1 0 1 1 1 1
  [2,24,1,0,1,1,1,1],
// 2 24 -1 0 1 -1 1 1
  [2,24,-1,0,1,-1,1,1],
// 2 24 1 0 -1 1 1 -1
  [2,24,1,0,-1,1,1,-1],
// 2 24 -1 0 -1 -1 1 -1
  [2,24,-1,0,-1,-1,1,-1],
// 4 16 1 1 1 1 1 -1 -1 1 -1 -1 1 1
  [4,16,1,1,1,1,1,-1,-1,1,-1,-1,1,1],
// 4 16 1 1 1 -1 1 1 -1 0 1 1 0 1
  [4,16,1,1,1,-1,1,1,-1,0,1,1,0,1],
// 4 16 -1 1 1 -1 1 -1 -1 0 -1 -1 0 1
  [4,16,-1,1,1,-1,1,-1,-1,0,-1,-1,0,1],
// 0 4 16 -1 1 -1 -1 0 -1 1 0 -1 1 1 -1
// 4 16 1 1 -1 1 1 1 1 0 1 1 0 -1
  [4,16,1,1,-1,1,1,1,1,0,1,1,0,-1],
// 0
];
makepoly(ldraw_lib__box4t(), line=0.2);
// file: s/3010s01.scad
use <../../lib.scad>
use <../../p/box4t.scad>
use <../../p/box5.scad>
use <../../p/stud.scad>
use <../../p/stud3.scad>
$fa=1; $fs=0.2;
function ldraw_lib__s__3010s01(realsolid=false) = [
// 0 ~Brick  1 x  4 without Front Face
// 0 Name: s\3010s01.dat
// 0 Author: Tony Hafner [hafhead]
// 0 !LDRAW_ORG Subpart UPDATE 2003-02
// 0 !LICENSE Licensed under CC BY 2.0 and CC BY 4.0 : see CAreadme.txt
// 
// 0 BFC CERTIFY CW
  [0,"BFC","CERTIFY"],
  [0,"BFC","CW"],
// 
// 0 !HISTORY 2003-08-01 [PTadmin] Official Update 2003-02
// 0 !HISTORY 2007-08-29 [PTadmin] Header formatted for Contributor Agreement
// 0 !HISTORY 2008-07-01 [PTadmin] Official Update 2008-01
// 
// 
// 1 16 0 24 0 40 0 0 0 -24 0 0 0 10 box4t.dat
  [1,16,0,24,0,40,0,0,0,-24,0,0,0,10, ldraw_lib__box4t(realsolid)],
// 0 BFC INVERTNEXT
  [0,"BFC","INVERTNEXT"],
// 1 16 0 24 0 36 0 0 0 -20 0 0 0 6 box5.dat
  [1,16,0,24,0,36,0,0,0,-20,0,0,0,6, ldraw_lib__box5(realsolid)],
// 1 16 -30 0 0 1 0 0 0 1 0 0 0 1 stud.dat
  [1,16,-30,0,0,1,0,0,0,1,0,0,0,1, ldraw_lib__stud(realsolid)],
// 1 16 -10 0 0 1 0 0 0 1 0 0 0 1 stud.dat
  [1,16,-10,0,0,1,0,0,0,1,0,0,0,1, ldraw_lib__stud(realsolid)],
// 1 16 10 0 0 1 0 0 0 1 0 0 0 1 stud.dat
  [1,16,10,0,0,1,0,0,0,1,0,0,0,1, ldraw_lib__stud(realsolid)],
// 1 16 30 0 0 1 0 0 0 1 0 0 0 1 stud.dat
  [1,16,30,0,0,1,0,0,0,1,0,0,0,1, ldraw_lib__stud(realsolid)],
// 1 16 -20 4 0 1 0 0 0 -5 0 0 0 1 stud3.dat
  [1,16,-20,4,0,1,0,0,0,-5,0,0,0,1, ldraw_lib__stud3(realsolid)],
// 1 16 0 4 0 1 0 0 0 -5 0 0 0 1 stud3.dat
  [1,16,0,4,0,1,0,0,0,-5,0,0,0,1, ldraw_lib__stud3(realsolid)],
// 1 16 20 4 0 1 0 0 0 -5 0 0 0 1 stud3.dat
  [1,16,20,4,0,1,0,0,0,-5,0,0,0,1, ldraw_lib__stud3(realsolid)],
// 4 16 -40 24 -10 40 24 -10 36 24 -6 -36 24 -6
  [4,16,-40,24,-10,40,24,-10,36,24,-6,-36,24,-6],
// 4 16 -40 24 10 -36 24 6 36 24 6 40 24 10
  [4,16,-40,24,10,-36,24,6,36,24,6,40,24,10],
// 4 16 -40 24 -10 -36 24 -6 -36 24 6 -40 24 10
  [4,16,-40,24,-10,-36,24,-6,-36,24,6,-40,24,10],
// 4 16 40 24 -10 40 24 10 36 24 6 36 24 -6
  [4,16,40,24,-10,40,24,10,36,24,6,36,24,-6],
// 0
];
module ldraw_lib__s__3010s01(step=0, col=false, unit=2/5, alt=false, line=0.2, solid=!$preview)
    makepoly(ldraw_lib__s__3010s01(solid), step=step, col=col, unit=unit, alt=alt, line=line, solid=solid);
ldraw_lib__s__3010s01(line=0.2);
// file: ../p/box5-12.scad
use <../lib.scad>
function ldraw_lib__box5_12() = [
// 0 Box with 5 Faces without Any Edges
// 0 Name: box5-12.dat
// 0 Author: Chris Dee [cwdee]
// 0 !LDRAW_ORG Primitive UPDATE 2009-02
// 0 !LICENSE Licensed under CC BY 2.0 and CC BY 4.0 : see CAreadme.txt
// 
// 0 BFC CERTIFY CCW
  [0,"BFC","CERTIFY"],
  [0,"BFC","CCW"],
// 
// 0 !HISTORY 2009-09-03 [PTadmin] Official Update 2009-02
// 
// 
// 4 16 1 1 1 1 1 -1 -1 1 -1 -1 1 1
  [4,16,1,1,1,1,1,-1,-1,1,-1,-1,1,1],
// 4 16 -1 0 1 1 0 1 1 1 1 -1 1 1
  [4,16,-1,0,1,1,0,1,1,1,1,-1,1,1],
// 4 16 -1 0 -1 -1 0 1 -1 1 1 -1 1 -1
  [4,16,-1,0,-1,-1,0,1,-1,1,1,-1,1,-1],
// 4 16 1 0 -1 -1 0 -1 -1 1 -1 1 1 -1
  [4,16,1,0,-1,-1,0,-1,-1,1,-1,1,1,-1],
// 4 16 1 0 1 1 0 -1 1 1 -1 1 1 1
  [4,16,1,0,1,1,0,-1,1,1,-1,1,1,1],
// 0
];
module ldraw_lib__box5_12(step=0, col=false, unit=2/5, alt=false, line=0.2, solid=!$preview)
    makepoly(ldraw_lib__box5_12(), step=step, col=col, unit=unit, alt=alt, line=line, solid=solid);
ldraw_lib__box5_12(line=0.2);
// file: 3010.scad
use <../lib.scad>
use <s/3010s01.scad>
function ldraw_lib__3010() = [
// 0 Brick  1 x  4
// 0 Name: 3010.dat
// 0 Author: James Jessiman
// 0 !LDRAW_ORG Part UPDATE 2025-09
// 0 !LICENSE Licensed under CC BY 4.0 : see CAreadme.txt
// 
// 0 BFC CERTIFY CCW
  [0,"BFC","CERTIFY"],
  [0,"BFC","CCW"],
// 
// 0 !HISTORY 2001-10-26 [PTadmin] Official Update 2001-01
// 0 !HISTORY 2002-05-07 {unknown} BFC Certification
// 0 !HISTORY 2002-06-11 [PTadmin] Official Update 2002-03
// 0 !HISTORY 2002-12-12 [hafhead] New subparted version
// 0 !HISTORY 2003-08-01 [PTadmin] Official Update 2003-02
// 0 !HISTORY 2007-06-06 [PTadmin] Header formatted for Contributor Agreement
// 0 !HISTORY 2008-07-01 [PTadmin] Official Update 2008-01
// 0 !HISTORY 2025-09-27 [OrionP] Changed winding to CCW
// 0 !HISTORY 2025-09-29 [OrionP] Official Update 2025-09
// 
// 1 16 0 0 0 1 0 0 0 1 0 0 0 1 s\3010s01.dat
  [1,16,0,0,0,1,0,0,0,1,0,0,0,1, ldraw_lib__s__3010s01()],
// 4 16 -40 24 -10 40 24 -10 40 0 -10 -40 0 -10
  [4,16,-40,24,-10,40,24,-10,40,0,-10,-40,0,-10],
// 0
];
module ldraw_lib__3010(step=0, col=false, unit=2/5, alt=false, line=0.2, solid=!$preview)
    makepoly(ldraw_lib__3010(), step=step, col=col, unit=unit, alt=alt, line=line, solid=solid);
ldraw_lib__3010(line=0.2);
// main file
use <../lib.scad>
use <190435a.scad>
use <3010.scad>
function ldraw_lib__3010d07() = [
// 0 Brick  1 x  4 with White "AUTO" Sticker
// 0 Name: 3010d07.dat
// 0 Author: Takeshi Takahashi [RainbowDolphin]
// 0 !LDRAW_ORG Shortcut UPDATE 2024-05
// 0 !LICENSE Licensed under CC BY 4.0 : see CAreadme.txt
// 
// 0 BFC CERTIFY CCW
  [0,"BFC","CERTIFY"],
  [0,"BFC","CCW"],
// 
// 0 !CATEGORY Sticker Shortcut
// 0 !KEYWORDS Auto service truck, Bricklink 3010pb062, Set 646-1
// 
// 0 !HISTORY 2024-06-30 [OrionP] Official Update 2024-05
// 
// 1 16 0 0 0 1 0 0 0 1 0 0 0 1 3010.dat
  [1,16,0,0,0,1,0,0,0,1,0,0,0,1, ldraw_lib__3010()],
// 1 16 0 12 -10 1 0 0 0 0 -1 0 1 0 190435a.dat
  [1,16,0,12,-10,1,0,0,0,0,-1,0,1,0, ldraw_lib__190435a()],
];
module ldraw_lib__3010d07(step=0, col=false, unit=2/5, alt=false, line=0.2, solid=!$preview)
    makepoly(ldraw_lib__3010d07(), step=step, col=col, unit=unit, alt=alt, line=line, solid=solid);
ldraw_lib__3010d07(line=0.2);
